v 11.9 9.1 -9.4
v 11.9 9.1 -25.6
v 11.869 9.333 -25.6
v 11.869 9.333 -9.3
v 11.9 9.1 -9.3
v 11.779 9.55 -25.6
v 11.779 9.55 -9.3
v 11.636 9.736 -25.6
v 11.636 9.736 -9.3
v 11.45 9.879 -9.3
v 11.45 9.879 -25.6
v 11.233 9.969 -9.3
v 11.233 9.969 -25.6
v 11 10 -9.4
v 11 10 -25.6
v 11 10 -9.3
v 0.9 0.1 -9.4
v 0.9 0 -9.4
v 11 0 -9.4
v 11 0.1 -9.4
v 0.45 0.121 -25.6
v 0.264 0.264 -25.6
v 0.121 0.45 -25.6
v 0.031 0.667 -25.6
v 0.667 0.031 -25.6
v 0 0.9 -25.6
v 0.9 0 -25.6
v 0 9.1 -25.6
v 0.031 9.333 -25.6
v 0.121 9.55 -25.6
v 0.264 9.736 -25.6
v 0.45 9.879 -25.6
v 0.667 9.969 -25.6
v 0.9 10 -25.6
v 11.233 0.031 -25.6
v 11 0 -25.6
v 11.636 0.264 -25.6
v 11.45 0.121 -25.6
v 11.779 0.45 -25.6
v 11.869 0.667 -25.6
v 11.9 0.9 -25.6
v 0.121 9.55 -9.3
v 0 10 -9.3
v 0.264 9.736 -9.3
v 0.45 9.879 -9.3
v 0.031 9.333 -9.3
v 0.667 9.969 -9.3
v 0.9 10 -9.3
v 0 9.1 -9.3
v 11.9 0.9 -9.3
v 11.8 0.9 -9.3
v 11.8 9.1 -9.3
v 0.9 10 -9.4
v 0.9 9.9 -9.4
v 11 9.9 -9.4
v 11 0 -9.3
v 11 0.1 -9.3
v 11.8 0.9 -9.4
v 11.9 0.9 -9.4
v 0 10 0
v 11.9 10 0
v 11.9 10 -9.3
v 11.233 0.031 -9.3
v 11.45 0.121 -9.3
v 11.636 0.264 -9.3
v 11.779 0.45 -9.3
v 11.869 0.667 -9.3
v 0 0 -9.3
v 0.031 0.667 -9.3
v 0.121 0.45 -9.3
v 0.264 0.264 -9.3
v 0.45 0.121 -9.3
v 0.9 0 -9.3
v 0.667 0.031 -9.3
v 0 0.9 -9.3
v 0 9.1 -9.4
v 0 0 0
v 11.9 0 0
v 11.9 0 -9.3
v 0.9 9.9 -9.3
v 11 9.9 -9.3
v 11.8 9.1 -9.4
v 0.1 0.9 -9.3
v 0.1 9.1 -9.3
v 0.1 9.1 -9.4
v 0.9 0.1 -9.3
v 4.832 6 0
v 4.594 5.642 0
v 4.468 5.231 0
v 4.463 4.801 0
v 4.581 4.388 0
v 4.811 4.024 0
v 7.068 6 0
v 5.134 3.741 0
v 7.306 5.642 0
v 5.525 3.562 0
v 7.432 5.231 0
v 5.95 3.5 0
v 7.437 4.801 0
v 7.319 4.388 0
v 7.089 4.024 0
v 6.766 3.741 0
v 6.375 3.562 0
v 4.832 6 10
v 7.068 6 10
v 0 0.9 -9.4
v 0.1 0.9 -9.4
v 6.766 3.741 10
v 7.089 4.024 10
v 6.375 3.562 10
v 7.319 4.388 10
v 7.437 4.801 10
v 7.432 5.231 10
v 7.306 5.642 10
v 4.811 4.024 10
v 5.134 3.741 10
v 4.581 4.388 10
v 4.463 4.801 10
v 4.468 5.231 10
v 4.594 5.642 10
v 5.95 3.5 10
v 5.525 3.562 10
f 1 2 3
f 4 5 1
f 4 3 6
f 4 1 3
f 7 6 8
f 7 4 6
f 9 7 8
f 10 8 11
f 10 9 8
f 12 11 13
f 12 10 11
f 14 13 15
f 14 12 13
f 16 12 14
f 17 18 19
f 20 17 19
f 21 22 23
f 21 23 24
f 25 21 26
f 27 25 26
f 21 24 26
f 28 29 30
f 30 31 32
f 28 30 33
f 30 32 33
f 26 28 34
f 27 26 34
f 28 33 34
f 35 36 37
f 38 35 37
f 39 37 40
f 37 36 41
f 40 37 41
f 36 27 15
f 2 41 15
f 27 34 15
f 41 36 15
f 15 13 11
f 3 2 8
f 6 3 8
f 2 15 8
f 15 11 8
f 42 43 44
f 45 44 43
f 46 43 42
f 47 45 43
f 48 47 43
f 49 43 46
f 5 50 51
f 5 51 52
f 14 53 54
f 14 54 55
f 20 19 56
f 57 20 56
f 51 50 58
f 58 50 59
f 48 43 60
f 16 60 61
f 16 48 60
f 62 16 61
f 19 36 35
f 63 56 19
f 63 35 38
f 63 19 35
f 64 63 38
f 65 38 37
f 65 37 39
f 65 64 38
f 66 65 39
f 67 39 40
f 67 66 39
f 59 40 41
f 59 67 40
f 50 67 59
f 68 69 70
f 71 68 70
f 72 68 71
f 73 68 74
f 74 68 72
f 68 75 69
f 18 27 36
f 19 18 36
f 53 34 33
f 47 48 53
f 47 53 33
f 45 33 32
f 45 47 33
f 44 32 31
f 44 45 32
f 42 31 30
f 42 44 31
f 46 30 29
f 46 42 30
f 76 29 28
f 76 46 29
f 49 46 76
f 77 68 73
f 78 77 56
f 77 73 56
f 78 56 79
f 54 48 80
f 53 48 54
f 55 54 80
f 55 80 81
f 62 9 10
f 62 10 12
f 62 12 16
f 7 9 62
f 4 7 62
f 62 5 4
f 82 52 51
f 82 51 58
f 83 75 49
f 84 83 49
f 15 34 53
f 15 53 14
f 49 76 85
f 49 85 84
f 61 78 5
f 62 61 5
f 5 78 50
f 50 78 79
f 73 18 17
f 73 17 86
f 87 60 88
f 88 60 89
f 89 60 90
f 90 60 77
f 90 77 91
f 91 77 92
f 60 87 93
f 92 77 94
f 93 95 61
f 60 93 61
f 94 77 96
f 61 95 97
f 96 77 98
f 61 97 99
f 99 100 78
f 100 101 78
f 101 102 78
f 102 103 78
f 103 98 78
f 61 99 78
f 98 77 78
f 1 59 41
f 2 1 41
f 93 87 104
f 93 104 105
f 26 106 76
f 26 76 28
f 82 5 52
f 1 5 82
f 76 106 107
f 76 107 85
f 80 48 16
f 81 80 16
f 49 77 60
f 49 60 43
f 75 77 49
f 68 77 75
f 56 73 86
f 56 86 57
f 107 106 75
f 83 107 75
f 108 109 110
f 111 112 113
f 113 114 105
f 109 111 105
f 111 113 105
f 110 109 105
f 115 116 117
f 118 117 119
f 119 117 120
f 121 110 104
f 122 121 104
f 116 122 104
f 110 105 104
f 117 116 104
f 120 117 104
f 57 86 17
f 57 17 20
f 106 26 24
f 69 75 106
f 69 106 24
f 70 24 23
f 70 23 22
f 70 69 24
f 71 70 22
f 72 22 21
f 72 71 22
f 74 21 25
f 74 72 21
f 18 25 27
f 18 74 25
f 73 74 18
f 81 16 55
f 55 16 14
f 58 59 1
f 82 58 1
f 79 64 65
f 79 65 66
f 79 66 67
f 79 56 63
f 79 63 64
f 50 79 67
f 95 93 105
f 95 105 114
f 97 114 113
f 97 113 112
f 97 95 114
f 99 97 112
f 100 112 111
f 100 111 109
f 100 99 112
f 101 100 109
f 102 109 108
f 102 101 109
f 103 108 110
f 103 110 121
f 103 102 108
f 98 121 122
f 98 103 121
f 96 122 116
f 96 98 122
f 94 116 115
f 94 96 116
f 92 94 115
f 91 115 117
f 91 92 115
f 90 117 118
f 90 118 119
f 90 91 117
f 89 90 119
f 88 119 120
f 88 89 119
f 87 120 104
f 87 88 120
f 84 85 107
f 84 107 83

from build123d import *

# Parameters (mm, degrees)
CROQUIS1_W              = 11.9
CROQUIS1_H              = 9.3
SALIENTE_EXTRUIR1_DEPTH = 10
SALIENTE_EXTRUIR2_DEPTH = 10
SALIENTE_EXTRUIR3_DEPTH = 16.3
CROQUIS6_W              = 10.1
CROQUIS6_H              = 0.1
CORTAR_EXTRUIR1_DEPTH   = 0.1
CROQUIS7_W              = 0.1
CROQUIS7_H              = 8.2
CORTAR_EXTRUIR2_DEPTH   = 0.1
CROQUIS8_W              = 0.1
CROQUIS8_H              = 8.2
CORTAR_EXTRUIR3_DEPTH   = 0.1
CROQUIS9_W              = 10.1
CROQUIS9_H              = 0.1
CORTAR_EXTRUIR4_DEPTH   = 0.1


with BuildPart() as part:
    # Croquis1 → Saliente-Extruir1 (new body)
    with BuildSketch(Plane(origin=(0, 0, 0), x_dir=(1, 0, 0), z_dir=(0, 1, 0))):
        with Locations((5.95, 4.65)):
            Rectangle(CROQUIS1_W, CROQUIS1_H)
    extrude(amount=SALIENTE_EXTRUIR1_DEPTH)

    # Croquis2 → Saliente-Extruir2 (add)
    with BuildSketch(Plane.XY):
        with BuildLine():
            Line((4.831966011, 6), (7.068033989, 6))
            ThreePointArc((7.068033989, 6), (5.95, 3.5), (4.831966011, 6))
        make_face()
    extrude(amount=SALIENTE_EXTRUIR2_DEPTH)

    # Croquis3 → Saliente-Extruir3 (add)
    with BuildSketch(Plane(origin=(0, 0, -9.3), x_dir=(-1, 0, 0), z_dir=(0, 0, -1))):
        with BuildLine():
            Line((-11, 10), (-0.9, 10))
            ThreePointArc((-0.9, 10), (-0.263603897, 9.736396103), (0, 9.1))
            Line((0, 9.1), (0, 0.9))
            ThreePointArc((0, 0.9), (-0.263603897, 0.263603897), (-0.9, 0))
            Line((-0.9, 0), (-11, 0))
            ThreePointArc((-11, 0), (-11.636396103, 0.263603897), (-11.9, 0.9))
            Line((-11.9, 0.9), (-11.9, 9.1))
            ThreePointArc((-11.9, 9.1), (-11.636396103, 9.736396103), (-11, 10))
        make_face()
    extrude(amount=SALIENTE_EXTRUIR3_DEPTH)

    # Croquis6 → Cortar-Extruir1 (cut)
    with BuildSketch(Plane(origin=(0, 10, 0), x_dir=(1, 0, 0), z_dir=(0, 1, 0))):
        with Locations((5.95, 9.35)):
            Rectangle(CROQUIS6_W, CROQUIS6_H)
    extrude(amount=-CORTAR_EXTRUIR1_DEPTH, mode=Mode.SUBTRACT)

    # Croquis7 → Cortar-Extruir2 (cut)
    with BuildSketch(Plane(origin=(11.9, 0, 0), x_dir=(0, 0, -1), z_dir=(1, 0, 0))):
        with Locations((9.35, 5)):
            Rectangle(CROQUIS7_W, CROQUIS7_H)
    extrude(amount=-CORTAR_EXTRUIR2_DEPTH, mode=Mode.SUBTRACT)

    # Croquis8 → Cortar-Extruir3 (cut)
    with BuildSketch(Plane.ZY):
        with Locations((-9.35, 5)):
            Rectangle(CROQUIS8_W, CROQUIS8_H)
    extrude(amount=-CORTAR_EXTRUIR3_DEPTH, mode=Mode.SUBTRACT)

    # Croquis9 → Cortar-Extruir4 (cut)
    with BuildSketch(Plane.XZ):
        with Locations((5.95, -9.35)):
            Rectangle(CROQUIS9_W, CROQUIS9_H)
    extrude(amount=-CORTAR_EXTRUIR4_DEPTH, mode=Mode.SUBTRACT)


solid = part.part
